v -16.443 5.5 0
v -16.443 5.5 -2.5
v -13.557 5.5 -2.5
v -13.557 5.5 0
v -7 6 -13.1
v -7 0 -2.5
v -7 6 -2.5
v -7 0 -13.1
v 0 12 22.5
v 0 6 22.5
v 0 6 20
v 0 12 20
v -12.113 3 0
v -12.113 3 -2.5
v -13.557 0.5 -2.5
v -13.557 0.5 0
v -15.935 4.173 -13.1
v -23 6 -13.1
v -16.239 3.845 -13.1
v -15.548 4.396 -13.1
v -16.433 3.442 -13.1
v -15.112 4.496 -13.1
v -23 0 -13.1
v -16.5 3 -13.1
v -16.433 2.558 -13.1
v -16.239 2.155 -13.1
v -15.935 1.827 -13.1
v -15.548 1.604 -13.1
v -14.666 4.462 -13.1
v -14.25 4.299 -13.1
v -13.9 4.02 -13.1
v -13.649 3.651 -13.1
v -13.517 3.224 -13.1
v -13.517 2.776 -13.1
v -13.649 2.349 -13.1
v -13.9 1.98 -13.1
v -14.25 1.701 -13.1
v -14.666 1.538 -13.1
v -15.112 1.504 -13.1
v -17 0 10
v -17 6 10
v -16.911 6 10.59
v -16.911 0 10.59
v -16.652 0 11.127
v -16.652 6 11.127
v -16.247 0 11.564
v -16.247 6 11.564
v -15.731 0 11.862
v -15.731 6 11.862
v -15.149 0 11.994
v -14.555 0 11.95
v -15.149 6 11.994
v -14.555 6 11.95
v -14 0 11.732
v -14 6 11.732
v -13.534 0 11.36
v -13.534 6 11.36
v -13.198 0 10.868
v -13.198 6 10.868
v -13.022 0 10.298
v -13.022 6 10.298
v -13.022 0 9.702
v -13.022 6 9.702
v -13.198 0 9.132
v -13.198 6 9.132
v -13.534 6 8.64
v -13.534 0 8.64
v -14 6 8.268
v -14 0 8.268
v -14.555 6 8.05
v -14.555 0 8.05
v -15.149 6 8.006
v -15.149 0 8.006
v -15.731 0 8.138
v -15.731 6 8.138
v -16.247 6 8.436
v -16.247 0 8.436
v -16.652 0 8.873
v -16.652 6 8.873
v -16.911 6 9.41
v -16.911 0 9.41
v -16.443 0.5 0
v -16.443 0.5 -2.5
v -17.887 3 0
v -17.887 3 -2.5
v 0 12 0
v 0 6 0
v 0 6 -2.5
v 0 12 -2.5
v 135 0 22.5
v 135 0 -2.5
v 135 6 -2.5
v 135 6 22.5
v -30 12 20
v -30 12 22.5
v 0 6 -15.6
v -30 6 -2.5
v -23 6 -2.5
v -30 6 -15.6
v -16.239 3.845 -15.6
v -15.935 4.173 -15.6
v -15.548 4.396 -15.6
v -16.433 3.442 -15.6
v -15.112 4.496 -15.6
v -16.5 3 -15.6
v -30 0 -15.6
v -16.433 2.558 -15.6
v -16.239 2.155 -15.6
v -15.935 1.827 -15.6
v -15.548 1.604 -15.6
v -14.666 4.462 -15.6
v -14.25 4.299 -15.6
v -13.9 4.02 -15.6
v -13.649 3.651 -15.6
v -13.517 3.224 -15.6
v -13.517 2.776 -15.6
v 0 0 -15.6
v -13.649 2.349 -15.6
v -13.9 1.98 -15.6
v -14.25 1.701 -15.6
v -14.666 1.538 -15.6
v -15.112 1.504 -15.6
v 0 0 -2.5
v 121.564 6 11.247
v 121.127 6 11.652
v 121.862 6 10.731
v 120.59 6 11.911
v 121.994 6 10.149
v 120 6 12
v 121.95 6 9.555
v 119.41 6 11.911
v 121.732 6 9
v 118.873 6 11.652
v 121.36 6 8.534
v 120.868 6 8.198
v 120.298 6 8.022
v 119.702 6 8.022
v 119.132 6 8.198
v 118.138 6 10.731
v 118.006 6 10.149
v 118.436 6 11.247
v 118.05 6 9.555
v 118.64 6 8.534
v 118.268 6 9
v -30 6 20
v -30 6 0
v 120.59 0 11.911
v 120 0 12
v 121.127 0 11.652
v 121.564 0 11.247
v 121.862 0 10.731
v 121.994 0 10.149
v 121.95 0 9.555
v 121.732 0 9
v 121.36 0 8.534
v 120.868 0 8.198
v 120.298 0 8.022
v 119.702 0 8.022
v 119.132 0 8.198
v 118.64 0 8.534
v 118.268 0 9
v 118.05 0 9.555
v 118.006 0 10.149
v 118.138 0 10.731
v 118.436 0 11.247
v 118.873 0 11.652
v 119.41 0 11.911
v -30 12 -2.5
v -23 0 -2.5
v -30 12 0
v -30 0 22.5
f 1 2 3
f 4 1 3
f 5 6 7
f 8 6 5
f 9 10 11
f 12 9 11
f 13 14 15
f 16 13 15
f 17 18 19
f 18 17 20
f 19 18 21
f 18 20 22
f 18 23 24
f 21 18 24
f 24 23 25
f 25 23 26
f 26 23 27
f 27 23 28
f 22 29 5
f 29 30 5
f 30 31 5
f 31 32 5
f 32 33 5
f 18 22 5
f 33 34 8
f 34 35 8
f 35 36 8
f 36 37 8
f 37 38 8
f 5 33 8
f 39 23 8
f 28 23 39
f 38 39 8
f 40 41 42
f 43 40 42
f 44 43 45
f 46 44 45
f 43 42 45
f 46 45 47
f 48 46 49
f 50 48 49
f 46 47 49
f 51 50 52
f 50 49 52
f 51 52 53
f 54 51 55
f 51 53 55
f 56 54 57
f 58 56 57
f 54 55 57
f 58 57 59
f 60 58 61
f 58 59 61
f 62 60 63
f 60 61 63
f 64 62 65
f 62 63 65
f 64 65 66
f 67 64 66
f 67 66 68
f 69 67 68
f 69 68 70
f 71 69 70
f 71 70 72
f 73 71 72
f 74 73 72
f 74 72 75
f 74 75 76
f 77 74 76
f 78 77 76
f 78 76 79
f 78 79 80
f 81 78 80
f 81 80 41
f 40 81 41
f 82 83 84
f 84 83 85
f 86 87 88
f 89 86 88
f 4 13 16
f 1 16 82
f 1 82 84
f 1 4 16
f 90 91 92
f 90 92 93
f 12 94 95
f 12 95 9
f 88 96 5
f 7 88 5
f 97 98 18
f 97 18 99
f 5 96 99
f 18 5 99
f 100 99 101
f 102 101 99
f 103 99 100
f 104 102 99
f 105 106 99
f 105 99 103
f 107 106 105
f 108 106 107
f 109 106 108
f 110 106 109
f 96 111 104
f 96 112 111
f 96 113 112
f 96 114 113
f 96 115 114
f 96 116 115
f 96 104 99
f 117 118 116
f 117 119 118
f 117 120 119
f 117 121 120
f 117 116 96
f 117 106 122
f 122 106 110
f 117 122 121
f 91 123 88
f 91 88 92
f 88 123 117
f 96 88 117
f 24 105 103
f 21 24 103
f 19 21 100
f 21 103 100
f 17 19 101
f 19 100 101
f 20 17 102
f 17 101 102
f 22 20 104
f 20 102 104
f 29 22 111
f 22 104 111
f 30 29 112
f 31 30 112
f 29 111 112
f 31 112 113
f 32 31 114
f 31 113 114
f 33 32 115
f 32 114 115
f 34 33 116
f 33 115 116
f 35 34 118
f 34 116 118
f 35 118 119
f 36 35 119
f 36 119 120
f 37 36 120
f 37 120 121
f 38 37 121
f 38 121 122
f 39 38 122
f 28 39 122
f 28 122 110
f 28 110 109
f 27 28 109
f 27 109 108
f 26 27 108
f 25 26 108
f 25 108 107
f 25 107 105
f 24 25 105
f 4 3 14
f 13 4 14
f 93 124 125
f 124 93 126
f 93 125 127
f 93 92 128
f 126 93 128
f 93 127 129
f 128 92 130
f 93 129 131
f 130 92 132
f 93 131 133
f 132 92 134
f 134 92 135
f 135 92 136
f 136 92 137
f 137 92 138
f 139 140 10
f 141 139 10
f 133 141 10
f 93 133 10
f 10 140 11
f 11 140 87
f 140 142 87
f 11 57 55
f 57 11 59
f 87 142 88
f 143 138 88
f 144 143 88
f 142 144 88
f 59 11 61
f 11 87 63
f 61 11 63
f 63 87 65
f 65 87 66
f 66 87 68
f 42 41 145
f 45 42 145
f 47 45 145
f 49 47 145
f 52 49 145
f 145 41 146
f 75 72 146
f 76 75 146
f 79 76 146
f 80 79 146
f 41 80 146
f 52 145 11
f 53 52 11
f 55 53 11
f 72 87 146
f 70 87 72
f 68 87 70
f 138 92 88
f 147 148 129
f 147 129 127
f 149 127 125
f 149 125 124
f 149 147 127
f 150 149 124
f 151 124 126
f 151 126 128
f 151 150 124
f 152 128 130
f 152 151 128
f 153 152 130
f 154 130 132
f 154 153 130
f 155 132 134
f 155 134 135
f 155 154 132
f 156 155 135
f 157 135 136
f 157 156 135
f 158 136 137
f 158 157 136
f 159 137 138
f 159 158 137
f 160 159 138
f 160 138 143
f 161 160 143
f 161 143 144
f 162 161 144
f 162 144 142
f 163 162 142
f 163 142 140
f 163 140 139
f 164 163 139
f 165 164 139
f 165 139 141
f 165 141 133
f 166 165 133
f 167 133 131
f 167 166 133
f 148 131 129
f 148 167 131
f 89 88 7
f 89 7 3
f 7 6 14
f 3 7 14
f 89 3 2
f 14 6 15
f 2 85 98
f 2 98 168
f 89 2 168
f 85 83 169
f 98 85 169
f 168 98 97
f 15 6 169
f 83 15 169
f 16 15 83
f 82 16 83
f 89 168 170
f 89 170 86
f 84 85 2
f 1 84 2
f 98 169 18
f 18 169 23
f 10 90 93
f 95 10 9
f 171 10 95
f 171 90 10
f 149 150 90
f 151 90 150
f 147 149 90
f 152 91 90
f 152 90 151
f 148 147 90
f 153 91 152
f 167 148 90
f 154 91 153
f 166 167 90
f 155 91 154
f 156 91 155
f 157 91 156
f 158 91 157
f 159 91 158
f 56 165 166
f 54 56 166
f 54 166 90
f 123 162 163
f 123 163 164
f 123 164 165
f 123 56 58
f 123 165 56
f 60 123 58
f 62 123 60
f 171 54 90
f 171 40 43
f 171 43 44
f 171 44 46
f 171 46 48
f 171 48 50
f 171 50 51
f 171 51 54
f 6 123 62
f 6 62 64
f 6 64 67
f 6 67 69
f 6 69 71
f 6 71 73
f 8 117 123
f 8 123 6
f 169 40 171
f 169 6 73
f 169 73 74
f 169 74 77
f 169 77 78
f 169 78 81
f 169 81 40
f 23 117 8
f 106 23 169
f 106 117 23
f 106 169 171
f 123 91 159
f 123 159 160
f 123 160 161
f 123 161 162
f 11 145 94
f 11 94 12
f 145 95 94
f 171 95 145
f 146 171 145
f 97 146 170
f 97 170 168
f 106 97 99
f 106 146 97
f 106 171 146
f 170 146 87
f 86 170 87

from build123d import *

# Parameters (mm, degrees)
SKETCH1_R           = 2
SKETCH1_W           = 16
SKETCH1_H           = 10.6
BOSS_EXTRUDE1_DEPTH = 6
SKETCH1_3_W         = 30
SKETCH1_3_H         = 2.5
BOSS_EXTRUDE2_DEPTH = 12
SKETCH3_R           = 1.5
CUT_EXTRUDE2_DEPTH  = 5
CUT_EXTRUDE3_DEPTH  = 2.5
SKETCH2_R           = 2
CUT_EXTRUDE1_DEPTH  = 137.99361299


with BuildPart() as part:
    # Sketch1 → Boss-Extrude1 (new body)
    with BuildSketch(Plane(origin=(0, 0, 0), x_dir=(1, 0, 0), z_dir=(0, 1, 0))):
        Polygon((135, 2.5), (0, 2.5), (0, 15.6), (-30, 15.6), (-30, -22.5), (135, -22.5), align=None)
        with Locations((120, -10)):
            Circle(SKETCH1_R, mode=Mode.SUBTRACT)
        with Locations((-15, 7.8)):
            Rectangle(SKETCH1_W, SKETCH1_H, mode=Mode.SUBTRACT)
    extrude(amount=BOSS_EXTRUDE1_DEPTH)

    # Sketch1<3> → Boss-Extrude2 (add)
    with BuildSketch(Plane(origin=(0, 0, 0), x_dir=(1, 0, 0), z_dir=(0, 1, 0))):
        with Locations((-15, -21.25)):
            Rectangle(SKETCH1_3_W, SKETCH1_3_H)
        with Locations((-15, 1.25)):
            Rectangle(SKETCH1_3_W, SKETCH1_3_H)
    extrude(amount=BOSS_EXTRUDE2_DEPTH)

    # Sketch3 → Cut-Extrude2 (cut)
    with BuildSketch(Plane(origin=(0, 0, -15.6), x_dir=(-1, 0, 0), z_dir=(0, 0, -1))):
        with Locations((15, 3)):
            Circle(SKETCH3_R)
    extrude(amount=-CUT_EXTRUDE2_DEPTH, mode=Mode.SUBTRACT)

    # Sketch4 → Cut-Extrude3 (cut)
    with BuildSketch(Plane(origin=(0, 0, -2.5), x_dir=(-1, 0, 0), z_dir=(0, 0, -1))):
        Polygon((16.443375673, 0.5), (17.886751346, 3), (16.443375673, 5.5), (13.556624327, 5.5), (12.113248654, 3), (13.556624327, 0.5), align=None)
    extrude(amount=-CUT_EXTRUDE3_DEPTH, mode=Mode.SUBTRACT)

    # Sketch2 → Cut-Extrude1 (cut, through all)
    with BuildSketch(Plane(origin=(0, 6, 0), x_dir=(1, 0, 0), z_dir=(0, 1, 0))):
        with Locations((-15, -10)):
            Circle(SKETCH2_R)
    extrude(amount=-CUT_EXTRUDE1_DEPTH, mode=Mode.SUBTRACT)


solid = part.part
